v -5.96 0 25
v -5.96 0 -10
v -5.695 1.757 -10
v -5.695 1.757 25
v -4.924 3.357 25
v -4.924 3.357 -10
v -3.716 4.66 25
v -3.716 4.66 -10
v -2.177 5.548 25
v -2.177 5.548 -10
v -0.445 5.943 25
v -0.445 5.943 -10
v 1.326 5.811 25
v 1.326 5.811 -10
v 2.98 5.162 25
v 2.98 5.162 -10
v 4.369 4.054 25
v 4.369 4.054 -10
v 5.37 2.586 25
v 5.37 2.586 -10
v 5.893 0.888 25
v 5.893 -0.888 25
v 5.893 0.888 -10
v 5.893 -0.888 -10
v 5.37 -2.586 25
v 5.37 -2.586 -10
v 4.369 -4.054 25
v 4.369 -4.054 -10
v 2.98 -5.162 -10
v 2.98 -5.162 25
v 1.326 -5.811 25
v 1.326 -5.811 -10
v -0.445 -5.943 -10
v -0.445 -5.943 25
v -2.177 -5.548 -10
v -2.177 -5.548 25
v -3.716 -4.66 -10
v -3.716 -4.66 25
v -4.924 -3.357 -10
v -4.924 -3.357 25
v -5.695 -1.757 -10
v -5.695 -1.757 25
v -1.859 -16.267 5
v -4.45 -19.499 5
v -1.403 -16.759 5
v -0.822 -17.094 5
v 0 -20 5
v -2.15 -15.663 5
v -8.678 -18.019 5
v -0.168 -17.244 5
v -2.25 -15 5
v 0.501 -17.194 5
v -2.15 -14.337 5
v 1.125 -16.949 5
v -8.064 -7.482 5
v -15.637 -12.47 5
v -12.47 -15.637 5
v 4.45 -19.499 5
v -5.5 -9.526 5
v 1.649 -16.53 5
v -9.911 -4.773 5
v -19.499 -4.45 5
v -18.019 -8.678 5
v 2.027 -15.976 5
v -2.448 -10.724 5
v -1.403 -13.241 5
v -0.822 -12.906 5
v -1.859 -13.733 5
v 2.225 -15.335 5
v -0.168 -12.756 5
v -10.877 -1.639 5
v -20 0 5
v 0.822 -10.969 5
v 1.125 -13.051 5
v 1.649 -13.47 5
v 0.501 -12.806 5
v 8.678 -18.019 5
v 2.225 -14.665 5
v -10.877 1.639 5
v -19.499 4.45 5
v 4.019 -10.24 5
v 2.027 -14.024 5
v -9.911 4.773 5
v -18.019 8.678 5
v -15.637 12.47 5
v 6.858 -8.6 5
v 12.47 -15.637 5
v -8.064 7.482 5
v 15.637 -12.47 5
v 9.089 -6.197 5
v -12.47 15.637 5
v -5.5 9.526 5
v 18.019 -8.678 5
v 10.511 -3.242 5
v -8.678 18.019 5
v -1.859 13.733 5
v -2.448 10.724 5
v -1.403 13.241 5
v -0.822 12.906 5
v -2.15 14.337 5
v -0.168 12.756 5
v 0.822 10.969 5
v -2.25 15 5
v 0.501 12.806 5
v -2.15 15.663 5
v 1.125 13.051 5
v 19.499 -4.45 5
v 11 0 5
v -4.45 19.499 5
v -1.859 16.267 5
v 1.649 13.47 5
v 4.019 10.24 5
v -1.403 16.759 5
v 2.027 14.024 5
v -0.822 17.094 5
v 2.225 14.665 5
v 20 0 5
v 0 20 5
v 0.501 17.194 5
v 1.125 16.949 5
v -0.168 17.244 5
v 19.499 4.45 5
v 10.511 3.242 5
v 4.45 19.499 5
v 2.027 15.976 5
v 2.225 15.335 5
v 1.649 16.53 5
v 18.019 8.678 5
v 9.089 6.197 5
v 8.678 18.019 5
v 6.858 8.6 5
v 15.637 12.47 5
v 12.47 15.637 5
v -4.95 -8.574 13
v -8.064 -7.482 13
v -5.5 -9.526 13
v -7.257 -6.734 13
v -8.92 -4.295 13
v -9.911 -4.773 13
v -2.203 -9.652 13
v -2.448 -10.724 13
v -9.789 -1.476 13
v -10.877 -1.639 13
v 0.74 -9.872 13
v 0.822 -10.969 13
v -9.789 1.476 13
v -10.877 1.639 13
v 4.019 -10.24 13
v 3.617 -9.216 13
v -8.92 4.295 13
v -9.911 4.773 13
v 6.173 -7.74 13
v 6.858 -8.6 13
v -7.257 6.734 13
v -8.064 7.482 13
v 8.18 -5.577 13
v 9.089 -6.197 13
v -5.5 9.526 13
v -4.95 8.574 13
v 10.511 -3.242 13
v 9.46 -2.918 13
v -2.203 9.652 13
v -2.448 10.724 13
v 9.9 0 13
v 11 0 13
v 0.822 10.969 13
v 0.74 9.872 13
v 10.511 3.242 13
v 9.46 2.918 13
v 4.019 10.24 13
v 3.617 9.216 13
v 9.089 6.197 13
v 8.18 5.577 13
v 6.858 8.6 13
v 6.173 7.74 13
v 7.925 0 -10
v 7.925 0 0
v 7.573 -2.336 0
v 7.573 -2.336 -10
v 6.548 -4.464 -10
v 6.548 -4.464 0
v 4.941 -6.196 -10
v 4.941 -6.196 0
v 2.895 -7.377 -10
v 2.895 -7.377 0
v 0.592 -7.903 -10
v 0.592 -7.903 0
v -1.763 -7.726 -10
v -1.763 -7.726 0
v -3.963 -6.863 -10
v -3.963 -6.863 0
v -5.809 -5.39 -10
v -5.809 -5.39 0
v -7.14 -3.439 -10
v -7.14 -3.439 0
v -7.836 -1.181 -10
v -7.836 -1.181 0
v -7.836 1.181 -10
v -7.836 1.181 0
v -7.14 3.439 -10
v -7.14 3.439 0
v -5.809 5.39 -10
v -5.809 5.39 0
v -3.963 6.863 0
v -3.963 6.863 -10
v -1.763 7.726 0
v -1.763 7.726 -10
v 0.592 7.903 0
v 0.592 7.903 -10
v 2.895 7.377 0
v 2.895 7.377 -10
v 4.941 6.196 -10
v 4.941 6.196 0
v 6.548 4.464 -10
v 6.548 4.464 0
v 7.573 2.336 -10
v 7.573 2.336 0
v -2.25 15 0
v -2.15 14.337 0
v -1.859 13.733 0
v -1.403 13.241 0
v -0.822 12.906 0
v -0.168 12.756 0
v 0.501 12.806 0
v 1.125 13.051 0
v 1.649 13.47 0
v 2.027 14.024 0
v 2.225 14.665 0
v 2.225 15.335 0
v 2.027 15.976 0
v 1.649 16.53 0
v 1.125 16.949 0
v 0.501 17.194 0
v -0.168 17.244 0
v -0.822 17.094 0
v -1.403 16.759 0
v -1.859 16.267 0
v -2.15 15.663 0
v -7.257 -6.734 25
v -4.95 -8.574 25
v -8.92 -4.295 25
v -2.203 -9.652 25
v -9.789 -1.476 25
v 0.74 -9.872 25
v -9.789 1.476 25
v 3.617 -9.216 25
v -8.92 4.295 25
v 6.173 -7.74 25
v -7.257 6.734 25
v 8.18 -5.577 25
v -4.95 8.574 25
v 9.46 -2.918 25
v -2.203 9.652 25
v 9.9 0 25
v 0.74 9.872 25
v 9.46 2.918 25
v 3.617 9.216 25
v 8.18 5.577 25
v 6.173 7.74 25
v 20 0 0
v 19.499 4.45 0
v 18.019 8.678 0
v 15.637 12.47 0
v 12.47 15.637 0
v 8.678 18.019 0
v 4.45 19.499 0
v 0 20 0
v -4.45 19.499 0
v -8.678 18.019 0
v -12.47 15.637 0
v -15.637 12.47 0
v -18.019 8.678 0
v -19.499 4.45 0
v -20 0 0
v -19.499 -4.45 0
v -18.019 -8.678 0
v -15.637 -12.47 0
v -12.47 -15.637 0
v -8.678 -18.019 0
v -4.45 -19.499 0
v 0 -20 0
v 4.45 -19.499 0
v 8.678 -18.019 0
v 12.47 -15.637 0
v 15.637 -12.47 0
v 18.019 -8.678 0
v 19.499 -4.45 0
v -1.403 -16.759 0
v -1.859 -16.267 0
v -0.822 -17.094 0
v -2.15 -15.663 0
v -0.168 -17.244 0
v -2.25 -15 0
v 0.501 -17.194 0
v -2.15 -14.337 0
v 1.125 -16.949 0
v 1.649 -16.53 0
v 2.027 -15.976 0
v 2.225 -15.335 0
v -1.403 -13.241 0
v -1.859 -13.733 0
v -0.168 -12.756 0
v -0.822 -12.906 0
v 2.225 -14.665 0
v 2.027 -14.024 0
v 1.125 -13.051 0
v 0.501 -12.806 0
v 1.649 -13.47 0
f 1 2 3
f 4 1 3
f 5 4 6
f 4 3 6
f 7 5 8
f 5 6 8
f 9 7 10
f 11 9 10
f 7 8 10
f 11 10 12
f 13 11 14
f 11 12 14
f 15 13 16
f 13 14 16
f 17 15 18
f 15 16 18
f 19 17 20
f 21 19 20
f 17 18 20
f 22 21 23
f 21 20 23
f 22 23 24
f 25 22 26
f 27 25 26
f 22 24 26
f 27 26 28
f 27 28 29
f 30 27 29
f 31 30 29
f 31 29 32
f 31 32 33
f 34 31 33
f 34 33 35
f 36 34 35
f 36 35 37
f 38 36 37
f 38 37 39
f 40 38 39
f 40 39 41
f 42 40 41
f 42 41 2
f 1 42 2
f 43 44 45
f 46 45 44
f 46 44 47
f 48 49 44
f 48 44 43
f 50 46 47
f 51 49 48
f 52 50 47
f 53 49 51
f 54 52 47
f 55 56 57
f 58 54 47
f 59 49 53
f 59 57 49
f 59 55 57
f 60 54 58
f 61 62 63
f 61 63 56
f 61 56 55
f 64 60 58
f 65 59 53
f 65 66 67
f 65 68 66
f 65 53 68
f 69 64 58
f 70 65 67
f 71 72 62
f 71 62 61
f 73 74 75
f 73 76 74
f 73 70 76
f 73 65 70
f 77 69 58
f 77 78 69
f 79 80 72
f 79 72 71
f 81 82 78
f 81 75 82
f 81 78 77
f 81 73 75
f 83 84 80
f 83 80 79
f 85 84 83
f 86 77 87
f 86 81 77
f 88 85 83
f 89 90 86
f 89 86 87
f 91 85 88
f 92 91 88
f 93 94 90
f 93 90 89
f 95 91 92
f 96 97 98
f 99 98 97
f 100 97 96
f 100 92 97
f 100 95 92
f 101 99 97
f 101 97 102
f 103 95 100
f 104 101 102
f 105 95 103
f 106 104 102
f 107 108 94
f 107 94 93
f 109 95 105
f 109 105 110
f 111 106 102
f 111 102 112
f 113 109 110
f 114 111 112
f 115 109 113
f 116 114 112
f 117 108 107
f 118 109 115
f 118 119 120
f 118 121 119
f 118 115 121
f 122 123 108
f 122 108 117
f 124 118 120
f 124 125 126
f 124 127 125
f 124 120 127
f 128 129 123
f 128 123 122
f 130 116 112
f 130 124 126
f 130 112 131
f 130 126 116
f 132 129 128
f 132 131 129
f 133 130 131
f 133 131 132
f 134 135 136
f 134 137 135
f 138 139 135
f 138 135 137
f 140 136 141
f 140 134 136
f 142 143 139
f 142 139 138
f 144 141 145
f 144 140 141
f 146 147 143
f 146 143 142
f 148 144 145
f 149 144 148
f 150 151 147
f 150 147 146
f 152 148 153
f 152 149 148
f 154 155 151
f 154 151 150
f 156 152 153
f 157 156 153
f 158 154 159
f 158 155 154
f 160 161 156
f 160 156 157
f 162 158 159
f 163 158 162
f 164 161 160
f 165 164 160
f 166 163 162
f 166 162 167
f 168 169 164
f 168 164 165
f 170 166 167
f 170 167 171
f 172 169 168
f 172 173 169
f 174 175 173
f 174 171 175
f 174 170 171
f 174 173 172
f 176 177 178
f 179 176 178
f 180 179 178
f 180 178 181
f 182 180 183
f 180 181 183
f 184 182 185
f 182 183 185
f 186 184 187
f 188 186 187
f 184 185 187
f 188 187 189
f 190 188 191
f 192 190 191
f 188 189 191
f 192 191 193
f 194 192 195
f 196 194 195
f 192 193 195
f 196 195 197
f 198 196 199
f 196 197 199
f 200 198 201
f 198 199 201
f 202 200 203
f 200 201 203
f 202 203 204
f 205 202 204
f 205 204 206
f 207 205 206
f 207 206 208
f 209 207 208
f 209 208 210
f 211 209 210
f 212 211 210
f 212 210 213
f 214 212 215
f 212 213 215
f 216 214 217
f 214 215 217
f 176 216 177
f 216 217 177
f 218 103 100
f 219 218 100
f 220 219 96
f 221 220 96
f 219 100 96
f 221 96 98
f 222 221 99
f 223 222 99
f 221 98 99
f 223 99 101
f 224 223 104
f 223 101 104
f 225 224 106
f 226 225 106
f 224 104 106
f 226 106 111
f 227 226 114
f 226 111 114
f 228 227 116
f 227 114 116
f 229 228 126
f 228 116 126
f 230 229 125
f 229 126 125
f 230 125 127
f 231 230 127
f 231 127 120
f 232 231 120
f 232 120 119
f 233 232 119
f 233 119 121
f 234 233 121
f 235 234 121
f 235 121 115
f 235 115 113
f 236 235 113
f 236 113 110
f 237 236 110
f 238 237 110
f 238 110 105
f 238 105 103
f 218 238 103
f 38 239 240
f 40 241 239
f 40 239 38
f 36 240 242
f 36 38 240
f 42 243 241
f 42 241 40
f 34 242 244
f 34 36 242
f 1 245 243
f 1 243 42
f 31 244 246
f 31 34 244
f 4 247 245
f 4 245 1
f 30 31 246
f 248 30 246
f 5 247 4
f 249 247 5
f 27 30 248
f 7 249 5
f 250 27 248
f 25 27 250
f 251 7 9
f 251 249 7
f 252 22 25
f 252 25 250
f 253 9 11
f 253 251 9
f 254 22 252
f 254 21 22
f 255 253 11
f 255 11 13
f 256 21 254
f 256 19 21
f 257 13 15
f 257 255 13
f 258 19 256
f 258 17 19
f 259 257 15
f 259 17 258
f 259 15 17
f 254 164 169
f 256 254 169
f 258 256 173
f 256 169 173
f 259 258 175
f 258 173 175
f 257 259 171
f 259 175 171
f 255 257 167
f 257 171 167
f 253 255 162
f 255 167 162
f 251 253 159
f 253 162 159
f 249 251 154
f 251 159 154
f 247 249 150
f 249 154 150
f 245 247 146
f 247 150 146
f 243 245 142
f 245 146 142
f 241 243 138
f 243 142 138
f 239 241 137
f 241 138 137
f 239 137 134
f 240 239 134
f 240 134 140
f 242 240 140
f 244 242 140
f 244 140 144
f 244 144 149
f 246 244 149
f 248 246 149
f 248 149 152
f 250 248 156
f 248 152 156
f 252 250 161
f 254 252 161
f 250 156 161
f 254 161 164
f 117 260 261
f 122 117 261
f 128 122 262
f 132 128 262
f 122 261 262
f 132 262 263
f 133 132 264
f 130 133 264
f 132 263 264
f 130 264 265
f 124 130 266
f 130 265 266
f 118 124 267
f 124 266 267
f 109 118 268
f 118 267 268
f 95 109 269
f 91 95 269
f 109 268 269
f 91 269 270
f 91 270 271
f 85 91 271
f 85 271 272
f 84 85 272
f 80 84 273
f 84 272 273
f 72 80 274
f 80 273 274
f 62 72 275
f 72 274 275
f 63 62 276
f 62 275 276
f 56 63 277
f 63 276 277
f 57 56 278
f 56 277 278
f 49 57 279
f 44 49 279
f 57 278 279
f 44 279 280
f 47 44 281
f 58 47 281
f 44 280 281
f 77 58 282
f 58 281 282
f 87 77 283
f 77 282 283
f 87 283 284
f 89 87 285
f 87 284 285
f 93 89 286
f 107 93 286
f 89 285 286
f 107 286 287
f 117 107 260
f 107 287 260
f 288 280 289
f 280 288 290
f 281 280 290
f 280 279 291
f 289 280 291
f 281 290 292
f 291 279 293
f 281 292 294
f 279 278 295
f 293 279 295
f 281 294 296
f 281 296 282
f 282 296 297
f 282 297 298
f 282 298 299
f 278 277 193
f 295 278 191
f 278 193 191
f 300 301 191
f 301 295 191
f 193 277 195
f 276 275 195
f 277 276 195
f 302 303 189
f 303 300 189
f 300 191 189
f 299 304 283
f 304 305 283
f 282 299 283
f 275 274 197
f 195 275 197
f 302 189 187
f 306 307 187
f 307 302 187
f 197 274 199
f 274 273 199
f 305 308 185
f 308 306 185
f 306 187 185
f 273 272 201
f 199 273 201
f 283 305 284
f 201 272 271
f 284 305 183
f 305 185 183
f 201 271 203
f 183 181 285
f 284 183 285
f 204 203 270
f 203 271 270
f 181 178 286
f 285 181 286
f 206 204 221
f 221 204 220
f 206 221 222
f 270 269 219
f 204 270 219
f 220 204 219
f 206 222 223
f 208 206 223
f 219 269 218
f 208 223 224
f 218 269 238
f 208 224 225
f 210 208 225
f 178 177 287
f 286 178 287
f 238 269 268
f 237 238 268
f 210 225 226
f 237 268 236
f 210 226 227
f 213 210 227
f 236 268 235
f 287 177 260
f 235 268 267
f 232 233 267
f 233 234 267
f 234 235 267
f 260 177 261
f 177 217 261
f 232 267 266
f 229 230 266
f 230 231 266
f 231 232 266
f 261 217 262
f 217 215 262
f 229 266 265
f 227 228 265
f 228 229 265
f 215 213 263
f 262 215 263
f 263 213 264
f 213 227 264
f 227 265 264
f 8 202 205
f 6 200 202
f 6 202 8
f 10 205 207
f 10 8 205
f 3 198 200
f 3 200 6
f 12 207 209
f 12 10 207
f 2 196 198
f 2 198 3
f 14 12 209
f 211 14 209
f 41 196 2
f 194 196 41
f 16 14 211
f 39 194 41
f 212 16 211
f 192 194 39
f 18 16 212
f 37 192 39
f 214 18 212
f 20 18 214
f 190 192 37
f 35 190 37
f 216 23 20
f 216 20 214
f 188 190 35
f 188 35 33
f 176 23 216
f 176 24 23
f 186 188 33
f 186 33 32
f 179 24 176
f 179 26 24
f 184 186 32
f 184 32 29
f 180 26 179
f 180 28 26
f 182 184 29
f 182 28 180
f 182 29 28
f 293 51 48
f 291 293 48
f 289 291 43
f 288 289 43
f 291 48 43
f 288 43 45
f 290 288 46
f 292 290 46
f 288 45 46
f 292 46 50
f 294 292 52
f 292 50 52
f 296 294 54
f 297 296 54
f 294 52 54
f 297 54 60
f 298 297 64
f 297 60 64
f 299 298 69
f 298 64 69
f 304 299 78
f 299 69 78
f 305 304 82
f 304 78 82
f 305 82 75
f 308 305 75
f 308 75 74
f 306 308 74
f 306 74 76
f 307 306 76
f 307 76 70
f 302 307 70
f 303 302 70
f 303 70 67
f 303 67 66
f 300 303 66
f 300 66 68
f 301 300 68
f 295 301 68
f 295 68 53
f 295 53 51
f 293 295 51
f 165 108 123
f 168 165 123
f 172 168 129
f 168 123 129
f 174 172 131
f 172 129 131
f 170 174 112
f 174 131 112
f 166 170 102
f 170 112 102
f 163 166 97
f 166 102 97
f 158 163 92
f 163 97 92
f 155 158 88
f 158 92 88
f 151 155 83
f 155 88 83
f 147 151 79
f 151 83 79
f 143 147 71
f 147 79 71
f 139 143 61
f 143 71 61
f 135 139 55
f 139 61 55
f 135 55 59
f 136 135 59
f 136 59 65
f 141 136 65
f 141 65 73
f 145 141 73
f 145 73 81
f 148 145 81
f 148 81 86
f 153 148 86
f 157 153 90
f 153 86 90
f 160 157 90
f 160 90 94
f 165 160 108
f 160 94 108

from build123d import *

# Parameters (mm, degrees)
F0_R     = 20
F1_DEPTH = 5
F2_R     = 11
F3_DEPTH = 8
F4_R     = 9.9
F5_DEPTH = 12
F6_R     = 7.925
F7_DEPTH = 10
F9_D     = 11.92
F11_D    = 4.5


with BuildPart() as f1:
    # F0 (on Top) → F1 (new body)
    with BuildSketch(Plane.XY):
        Circle(F0_R)
    extrude(amount=F1_DEPTH)

    # F2 (on face) → F3 (join)
    with BuildSketch(Plane.XY.offset(5)):
        Circle(F2_R)
    extrude(amount=F3_DEPTH)

    # F4 (on face) → F5 (join)
    with BuildSketch(Plane.XY.offset(13)):
        Circle(F4_R)
    extrude(amount=F5_DEPTH)

    # F6 (on face) → F7 (join)
    with BuildSketch(Plane(origin=(0, 0, 0), x_dir=(1, 0, 0), z_dir=(0, 0, -1))):
        Circle(F6_R)
    extrude(amount=F7_DEPTH)

    # F9 (through all)
    with Locations(Plane.XY.offset(25)):
        with Locations((0, 0)):
            Hole(F9_D / 2)

    # F11 (through all)
    with Locations(Plane(origin=(0, 0, 0), x_dir=(1, 0, 0), z_dir=(0, 0, -1))):
        with Locations((0, -15), (0, 15)):
            Hole(F11_D / 2)


solid = f1.part
